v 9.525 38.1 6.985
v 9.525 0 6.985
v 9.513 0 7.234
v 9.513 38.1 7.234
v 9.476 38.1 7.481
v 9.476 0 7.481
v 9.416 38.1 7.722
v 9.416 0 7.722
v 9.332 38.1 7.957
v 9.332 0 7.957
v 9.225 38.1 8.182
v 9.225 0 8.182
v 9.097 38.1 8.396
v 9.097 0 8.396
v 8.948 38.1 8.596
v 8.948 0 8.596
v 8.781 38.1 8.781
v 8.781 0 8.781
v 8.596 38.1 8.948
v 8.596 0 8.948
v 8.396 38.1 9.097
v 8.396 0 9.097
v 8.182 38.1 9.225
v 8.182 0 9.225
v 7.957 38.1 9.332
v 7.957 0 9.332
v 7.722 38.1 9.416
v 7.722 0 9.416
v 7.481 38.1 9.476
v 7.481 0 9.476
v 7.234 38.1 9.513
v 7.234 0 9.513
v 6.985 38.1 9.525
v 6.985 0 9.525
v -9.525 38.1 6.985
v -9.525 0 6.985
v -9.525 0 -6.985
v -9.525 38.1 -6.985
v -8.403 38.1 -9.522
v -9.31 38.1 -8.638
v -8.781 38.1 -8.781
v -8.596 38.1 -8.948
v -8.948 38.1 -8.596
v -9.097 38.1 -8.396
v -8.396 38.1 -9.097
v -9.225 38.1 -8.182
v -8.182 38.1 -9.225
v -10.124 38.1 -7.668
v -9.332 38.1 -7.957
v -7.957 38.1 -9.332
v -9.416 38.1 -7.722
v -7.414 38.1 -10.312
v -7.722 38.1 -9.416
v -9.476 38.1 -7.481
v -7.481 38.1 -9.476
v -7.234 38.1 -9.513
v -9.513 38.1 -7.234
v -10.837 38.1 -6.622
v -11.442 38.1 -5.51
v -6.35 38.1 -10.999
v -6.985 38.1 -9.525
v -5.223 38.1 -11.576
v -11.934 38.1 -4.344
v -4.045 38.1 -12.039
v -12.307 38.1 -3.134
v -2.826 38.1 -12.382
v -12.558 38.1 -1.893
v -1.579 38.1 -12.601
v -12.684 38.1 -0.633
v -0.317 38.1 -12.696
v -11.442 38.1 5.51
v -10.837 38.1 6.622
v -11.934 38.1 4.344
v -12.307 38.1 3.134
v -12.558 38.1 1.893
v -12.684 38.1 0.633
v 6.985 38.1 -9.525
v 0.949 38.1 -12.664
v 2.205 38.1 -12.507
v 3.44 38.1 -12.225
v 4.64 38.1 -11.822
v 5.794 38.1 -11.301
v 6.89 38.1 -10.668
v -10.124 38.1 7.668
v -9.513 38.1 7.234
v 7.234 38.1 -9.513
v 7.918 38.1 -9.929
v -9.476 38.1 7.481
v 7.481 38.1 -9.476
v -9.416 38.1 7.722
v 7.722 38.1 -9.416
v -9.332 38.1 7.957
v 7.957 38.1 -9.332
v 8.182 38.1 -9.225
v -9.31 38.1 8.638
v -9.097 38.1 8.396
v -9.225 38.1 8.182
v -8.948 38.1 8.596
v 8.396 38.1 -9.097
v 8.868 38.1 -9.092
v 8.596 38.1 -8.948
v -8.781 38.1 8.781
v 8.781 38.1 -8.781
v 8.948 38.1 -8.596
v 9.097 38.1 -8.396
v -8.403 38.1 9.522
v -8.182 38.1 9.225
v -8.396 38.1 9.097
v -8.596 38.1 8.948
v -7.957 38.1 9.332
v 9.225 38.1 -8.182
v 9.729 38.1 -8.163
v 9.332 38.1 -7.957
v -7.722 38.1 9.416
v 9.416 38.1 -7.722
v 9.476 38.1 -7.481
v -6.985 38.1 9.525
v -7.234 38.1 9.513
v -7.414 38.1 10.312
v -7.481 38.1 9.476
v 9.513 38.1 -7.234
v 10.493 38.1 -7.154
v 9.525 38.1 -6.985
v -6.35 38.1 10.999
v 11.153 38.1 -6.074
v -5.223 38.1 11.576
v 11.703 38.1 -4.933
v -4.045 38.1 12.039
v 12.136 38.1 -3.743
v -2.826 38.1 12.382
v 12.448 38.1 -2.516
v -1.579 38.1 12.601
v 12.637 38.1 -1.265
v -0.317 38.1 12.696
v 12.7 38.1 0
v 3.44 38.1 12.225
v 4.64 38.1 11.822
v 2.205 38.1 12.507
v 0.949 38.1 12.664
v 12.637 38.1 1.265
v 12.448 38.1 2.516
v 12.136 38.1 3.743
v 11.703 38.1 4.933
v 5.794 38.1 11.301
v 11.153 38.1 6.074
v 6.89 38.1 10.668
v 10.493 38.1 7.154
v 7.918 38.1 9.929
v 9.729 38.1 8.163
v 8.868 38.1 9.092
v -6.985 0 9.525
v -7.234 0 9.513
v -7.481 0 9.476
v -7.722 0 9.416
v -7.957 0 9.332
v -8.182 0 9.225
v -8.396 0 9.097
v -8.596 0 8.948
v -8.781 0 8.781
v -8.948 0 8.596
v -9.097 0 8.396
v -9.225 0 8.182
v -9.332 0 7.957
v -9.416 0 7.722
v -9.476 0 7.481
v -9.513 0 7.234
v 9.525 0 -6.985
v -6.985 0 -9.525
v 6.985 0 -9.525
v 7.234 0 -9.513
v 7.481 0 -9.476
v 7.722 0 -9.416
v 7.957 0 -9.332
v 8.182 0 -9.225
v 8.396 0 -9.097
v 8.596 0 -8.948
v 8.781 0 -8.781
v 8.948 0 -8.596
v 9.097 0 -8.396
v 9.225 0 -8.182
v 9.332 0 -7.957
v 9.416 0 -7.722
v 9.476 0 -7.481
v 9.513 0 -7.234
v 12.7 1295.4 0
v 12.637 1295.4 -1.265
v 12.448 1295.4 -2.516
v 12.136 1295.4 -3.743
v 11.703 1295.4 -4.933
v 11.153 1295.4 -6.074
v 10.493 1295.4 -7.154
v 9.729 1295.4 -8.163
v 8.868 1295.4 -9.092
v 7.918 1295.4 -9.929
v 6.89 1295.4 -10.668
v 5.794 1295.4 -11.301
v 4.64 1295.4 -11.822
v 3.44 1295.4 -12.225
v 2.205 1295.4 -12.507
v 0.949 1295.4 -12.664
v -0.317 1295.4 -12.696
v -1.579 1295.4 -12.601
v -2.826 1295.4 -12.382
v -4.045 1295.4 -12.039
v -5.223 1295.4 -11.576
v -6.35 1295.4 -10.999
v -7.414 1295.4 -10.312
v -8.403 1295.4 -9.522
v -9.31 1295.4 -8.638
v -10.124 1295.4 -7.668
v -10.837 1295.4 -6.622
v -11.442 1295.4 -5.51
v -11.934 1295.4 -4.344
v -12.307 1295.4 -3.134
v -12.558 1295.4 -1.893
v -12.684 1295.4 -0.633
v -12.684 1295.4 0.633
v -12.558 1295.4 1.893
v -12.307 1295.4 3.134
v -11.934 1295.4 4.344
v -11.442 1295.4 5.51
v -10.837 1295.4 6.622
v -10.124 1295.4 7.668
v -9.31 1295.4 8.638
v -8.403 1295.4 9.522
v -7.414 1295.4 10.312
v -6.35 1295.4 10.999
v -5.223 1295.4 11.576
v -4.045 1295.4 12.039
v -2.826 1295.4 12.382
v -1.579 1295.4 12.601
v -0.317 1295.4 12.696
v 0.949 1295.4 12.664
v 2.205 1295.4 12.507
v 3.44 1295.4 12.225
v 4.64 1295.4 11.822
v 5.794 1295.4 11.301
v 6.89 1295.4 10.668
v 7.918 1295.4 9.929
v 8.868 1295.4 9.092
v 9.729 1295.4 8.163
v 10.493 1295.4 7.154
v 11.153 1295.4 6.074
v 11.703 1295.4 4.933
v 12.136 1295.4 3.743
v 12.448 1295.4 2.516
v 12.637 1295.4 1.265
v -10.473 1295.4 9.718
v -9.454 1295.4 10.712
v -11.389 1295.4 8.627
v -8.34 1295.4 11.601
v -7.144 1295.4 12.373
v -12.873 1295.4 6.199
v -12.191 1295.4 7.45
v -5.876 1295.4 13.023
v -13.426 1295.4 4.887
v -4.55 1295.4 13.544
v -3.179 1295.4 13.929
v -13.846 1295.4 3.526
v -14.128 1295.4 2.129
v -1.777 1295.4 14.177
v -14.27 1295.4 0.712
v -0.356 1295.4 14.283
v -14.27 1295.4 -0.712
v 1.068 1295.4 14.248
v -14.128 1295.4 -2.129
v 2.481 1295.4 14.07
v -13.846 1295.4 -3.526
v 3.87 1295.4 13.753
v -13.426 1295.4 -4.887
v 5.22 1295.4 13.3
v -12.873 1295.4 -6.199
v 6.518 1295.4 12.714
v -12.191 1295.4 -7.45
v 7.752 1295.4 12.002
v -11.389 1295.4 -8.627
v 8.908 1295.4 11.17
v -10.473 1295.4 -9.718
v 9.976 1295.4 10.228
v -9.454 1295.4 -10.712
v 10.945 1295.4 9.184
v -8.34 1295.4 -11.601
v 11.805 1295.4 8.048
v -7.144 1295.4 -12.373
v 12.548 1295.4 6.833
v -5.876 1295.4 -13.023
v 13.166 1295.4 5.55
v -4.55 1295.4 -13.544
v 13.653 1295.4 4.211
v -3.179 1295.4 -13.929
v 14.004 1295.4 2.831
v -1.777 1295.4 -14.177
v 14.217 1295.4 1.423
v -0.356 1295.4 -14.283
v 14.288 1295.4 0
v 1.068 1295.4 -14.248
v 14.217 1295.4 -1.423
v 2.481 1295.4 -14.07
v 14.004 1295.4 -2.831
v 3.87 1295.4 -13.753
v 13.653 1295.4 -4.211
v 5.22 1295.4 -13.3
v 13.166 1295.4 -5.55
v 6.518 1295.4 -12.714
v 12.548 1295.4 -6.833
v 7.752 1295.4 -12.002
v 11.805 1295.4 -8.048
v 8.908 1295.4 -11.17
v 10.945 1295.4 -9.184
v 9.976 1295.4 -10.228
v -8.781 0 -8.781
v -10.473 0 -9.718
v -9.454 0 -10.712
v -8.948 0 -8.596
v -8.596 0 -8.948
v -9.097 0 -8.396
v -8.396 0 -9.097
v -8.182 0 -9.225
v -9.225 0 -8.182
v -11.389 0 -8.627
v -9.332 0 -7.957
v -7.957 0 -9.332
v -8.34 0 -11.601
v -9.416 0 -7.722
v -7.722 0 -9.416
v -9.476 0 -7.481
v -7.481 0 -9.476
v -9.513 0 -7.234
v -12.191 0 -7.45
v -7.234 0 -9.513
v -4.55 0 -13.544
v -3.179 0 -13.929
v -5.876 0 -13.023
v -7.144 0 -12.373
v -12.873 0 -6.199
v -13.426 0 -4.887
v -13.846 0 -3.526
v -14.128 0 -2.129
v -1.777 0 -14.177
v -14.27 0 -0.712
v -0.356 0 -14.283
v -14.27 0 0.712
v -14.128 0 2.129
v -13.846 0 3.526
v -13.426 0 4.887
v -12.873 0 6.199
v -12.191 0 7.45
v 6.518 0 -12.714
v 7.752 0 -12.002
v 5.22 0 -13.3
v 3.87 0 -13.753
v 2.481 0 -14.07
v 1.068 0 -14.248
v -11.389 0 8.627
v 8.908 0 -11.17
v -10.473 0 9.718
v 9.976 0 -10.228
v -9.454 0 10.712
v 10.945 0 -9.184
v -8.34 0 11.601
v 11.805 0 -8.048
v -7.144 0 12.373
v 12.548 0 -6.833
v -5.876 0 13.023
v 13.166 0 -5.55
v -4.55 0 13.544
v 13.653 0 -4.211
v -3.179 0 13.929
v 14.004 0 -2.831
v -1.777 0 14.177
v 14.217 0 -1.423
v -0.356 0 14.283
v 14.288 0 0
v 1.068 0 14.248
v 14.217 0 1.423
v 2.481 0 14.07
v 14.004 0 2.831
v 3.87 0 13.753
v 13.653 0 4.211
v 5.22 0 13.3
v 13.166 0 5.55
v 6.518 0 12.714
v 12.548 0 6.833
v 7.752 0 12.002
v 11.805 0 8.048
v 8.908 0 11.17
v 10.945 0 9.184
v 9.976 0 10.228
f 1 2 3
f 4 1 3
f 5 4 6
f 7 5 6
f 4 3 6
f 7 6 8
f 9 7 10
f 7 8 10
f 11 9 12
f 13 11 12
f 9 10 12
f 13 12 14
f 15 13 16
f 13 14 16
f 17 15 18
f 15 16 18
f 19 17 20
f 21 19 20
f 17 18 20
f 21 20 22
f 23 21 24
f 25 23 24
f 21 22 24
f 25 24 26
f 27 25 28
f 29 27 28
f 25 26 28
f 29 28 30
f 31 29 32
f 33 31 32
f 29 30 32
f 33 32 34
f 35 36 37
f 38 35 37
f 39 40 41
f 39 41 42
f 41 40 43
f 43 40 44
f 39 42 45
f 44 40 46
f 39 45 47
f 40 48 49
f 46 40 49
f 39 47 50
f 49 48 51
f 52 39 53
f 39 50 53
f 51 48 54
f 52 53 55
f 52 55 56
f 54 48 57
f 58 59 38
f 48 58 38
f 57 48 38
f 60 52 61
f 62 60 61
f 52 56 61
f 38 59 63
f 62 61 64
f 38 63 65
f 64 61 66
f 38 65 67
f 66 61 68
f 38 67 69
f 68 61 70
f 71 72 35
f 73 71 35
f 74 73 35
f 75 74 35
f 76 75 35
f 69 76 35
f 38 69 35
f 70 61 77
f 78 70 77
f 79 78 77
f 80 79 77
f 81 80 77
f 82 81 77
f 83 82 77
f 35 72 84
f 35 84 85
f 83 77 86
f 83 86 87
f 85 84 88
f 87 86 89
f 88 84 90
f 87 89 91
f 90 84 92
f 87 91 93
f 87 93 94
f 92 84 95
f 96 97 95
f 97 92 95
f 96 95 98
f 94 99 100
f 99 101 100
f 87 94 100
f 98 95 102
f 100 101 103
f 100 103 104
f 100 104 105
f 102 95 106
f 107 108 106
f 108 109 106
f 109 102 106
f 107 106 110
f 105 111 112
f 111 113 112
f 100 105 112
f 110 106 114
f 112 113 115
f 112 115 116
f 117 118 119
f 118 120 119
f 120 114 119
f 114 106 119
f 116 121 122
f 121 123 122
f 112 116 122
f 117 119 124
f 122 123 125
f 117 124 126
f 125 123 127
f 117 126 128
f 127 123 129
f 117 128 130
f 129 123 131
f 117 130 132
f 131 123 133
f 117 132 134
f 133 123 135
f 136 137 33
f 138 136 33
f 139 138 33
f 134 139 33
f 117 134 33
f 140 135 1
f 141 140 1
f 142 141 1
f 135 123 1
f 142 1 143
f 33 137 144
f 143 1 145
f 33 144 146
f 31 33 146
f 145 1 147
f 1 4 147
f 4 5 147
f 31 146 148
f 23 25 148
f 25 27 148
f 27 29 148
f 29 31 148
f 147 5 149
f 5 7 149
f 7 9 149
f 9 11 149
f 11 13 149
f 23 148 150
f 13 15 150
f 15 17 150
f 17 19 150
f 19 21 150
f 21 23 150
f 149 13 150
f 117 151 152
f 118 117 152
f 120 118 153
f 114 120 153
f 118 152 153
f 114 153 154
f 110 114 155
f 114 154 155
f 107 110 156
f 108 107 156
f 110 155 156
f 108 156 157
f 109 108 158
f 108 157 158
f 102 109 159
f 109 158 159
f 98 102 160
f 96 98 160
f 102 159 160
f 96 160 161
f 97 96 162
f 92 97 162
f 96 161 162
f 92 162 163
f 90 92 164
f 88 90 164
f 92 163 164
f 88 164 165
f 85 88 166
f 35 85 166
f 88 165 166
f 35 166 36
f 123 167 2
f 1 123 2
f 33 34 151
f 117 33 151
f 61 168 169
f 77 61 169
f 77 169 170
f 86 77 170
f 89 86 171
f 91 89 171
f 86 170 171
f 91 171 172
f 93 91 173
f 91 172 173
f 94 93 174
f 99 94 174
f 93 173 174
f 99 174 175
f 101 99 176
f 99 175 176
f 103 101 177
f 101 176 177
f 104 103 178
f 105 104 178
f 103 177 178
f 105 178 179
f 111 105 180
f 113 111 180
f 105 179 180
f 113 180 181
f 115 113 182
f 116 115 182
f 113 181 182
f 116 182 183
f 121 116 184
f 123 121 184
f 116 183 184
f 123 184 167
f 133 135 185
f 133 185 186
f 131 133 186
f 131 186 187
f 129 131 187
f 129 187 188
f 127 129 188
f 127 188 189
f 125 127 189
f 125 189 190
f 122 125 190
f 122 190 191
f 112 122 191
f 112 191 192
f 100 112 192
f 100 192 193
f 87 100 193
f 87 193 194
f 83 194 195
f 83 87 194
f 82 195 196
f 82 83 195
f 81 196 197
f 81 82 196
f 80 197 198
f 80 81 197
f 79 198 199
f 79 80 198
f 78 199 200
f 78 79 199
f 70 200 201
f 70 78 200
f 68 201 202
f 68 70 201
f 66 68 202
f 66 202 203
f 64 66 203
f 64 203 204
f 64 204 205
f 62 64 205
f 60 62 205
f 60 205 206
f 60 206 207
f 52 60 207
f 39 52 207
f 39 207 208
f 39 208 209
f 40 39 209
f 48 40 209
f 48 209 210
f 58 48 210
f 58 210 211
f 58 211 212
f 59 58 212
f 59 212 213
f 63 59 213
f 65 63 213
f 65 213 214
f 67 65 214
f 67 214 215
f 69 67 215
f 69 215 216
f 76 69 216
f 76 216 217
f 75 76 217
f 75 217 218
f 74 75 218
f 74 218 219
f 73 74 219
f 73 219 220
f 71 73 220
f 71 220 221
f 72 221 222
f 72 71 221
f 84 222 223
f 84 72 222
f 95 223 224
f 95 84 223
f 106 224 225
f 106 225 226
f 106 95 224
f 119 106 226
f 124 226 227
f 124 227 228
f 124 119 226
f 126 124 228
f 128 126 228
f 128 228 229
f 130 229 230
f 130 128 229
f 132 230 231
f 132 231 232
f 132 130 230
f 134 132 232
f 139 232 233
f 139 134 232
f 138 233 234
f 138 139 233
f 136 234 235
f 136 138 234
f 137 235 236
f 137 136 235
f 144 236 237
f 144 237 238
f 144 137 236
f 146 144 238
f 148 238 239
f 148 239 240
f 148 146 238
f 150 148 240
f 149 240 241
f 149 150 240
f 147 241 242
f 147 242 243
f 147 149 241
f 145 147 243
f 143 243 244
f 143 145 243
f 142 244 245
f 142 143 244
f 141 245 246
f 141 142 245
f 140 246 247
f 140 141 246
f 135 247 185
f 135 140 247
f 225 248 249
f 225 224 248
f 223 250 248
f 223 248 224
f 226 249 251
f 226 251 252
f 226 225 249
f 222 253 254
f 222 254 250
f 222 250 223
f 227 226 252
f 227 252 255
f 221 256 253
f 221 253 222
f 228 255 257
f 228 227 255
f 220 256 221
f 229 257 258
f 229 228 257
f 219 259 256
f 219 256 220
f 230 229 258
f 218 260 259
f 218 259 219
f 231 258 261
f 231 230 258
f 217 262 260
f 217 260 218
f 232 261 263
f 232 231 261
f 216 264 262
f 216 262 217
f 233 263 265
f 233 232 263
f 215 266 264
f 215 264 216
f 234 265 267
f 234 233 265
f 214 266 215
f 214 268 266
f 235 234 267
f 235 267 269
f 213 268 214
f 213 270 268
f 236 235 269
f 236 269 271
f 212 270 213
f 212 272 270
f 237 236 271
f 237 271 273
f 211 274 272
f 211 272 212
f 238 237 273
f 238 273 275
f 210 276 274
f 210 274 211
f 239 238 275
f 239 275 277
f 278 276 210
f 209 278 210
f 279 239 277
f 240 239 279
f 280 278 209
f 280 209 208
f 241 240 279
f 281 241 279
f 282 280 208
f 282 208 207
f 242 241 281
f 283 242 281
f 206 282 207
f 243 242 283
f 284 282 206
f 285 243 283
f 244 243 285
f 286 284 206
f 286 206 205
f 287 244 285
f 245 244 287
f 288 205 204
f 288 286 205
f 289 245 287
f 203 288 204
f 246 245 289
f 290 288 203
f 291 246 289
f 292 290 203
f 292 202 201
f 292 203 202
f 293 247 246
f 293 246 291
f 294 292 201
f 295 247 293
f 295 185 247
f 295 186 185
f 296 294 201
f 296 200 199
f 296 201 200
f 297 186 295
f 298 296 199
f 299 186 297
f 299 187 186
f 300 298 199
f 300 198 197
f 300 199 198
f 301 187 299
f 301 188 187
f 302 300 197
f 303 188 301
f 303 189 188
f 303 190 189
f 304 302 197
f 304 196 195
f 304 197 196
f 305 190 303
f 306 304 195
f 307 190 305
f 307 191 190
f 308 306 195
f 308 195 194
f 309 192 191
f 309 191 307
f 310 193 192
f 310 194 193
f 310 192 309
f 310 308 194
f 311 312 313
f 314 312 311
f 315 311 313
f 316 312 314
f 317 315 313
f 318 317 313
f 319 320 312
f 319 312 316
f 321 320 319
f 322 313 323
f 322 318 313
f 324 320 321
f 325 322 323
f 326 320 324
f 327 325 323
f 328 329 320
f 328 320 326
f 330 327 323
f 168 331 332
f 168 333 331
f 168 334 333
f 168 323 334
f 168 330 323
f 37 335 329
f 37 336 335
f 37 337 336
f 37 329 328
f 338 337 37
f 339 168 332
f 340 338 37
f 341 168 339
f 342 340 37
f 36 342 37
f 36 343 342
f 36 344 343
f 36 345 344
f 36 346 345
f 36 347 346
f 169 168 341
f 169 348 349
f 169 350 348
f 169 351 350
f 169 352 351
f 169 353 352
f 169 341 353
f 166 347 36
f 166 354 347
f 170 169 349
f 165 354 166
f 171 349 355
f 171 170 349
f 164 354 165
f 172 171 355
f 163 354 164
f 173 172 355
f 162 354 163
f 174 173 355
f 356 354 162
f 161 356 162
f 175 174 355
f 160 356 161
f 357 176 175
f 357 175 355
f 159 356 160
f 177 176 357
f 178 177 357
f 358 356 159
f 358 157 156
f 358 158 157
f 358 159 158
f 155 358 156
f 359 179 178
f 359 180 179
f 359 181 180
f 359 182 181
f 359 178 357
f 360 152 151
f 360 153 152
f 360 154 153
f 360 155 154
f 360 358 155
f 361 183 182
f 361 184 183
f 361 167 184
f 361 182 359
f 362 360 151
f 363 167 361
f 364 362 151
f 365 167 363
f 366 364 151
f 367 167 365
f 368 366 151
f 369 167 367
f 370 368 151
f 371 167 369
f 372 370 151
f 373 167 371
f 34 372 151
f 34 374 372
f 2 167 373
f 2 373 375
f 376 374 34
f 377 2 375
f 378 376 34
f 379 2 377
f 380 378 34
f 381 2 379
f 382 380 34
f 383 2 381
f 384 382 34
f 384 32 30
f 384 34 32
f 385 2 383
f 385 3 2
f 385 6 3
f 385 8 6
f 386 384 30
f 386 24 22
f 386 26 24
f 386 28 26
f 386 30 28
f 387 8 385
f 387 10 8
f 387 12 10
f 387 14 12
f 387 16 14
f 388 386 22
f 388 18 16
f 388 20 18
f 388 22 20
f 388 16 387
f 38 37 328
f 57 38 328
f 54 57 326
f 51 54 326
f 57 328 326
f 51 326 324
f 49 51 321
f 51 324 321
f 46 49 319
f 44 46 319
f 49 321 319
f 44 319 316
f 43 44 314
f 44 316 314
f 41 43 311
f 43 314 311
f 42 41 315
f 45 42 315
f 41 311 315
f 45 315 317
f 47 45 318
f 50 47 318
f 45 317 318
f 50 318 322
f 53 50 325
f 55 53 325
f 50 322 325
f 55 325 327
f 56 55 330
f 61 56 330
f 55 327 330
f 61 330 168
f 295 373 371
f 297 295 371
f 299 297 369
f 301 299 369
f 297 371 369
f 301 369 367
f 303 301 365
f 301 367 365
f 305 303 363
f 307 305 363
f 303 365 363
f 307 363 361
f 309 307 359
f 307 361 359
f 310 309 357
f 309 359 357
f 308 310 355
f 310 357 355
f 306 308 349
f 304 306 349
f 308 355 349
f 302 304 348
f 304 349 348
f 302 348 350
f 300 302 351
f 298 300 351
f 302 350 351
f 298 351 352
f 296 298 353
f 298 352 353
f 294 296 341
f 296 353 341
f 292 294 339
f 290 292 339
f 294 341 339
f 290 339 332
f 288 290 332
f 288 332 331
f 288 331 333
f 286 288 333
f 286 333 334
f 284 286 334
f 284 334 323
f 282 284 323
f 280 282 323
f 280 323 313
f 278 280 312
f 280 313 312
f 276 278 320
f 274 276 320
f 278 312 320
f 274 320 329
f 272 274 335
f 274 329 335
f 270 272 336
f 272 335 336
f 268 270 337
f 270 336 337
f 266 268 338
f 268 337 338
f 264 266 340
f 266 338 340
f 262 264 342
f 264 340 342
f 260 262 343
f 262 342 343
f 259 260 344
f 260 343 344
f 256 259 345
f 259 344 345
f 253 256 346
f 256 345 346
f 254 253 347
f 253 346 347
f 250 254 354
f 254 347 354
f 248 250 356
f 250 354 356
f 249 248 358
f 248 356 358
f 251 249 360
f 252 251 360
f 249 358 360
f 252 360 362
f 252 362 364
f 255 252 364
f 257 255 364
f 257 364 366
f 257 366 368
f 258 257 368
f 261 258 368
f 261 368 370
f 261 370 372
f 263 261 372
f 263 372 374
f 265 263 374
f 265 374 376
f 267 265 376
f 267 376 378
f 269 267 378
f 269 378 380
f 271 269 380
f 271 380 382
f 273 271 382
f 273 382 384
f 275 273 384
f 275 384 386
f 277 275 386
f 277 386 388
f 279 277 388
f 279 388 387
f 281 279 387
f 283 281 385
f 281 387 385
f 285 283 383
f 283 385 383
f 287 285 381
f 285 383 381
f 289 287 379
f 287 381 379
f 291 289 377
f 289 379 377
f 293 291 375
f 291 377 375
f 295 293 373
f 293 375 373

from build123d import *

# Parameters (mm, degrees)
SKETCH1_R           = 14.2875
SKETCH1_R_2         = 12.7
BOSS_EXTRUDE1_DEPTH = 1295.4
SKETCH2_R           = 12.7
BOSS_EXTRUDE2_DEPTH = 38.1


with BuildPart() as part:
    # Sketch1 → Boss-Extrude1 (new body)
    with BuildSketch(Plane(origin=(0, 0, 0), x_dir=(1, 0, 0), z_dir=(0, 1, 0))):
        Circle(SKETCH1_R)
        Circle(SKETCH1_R_2, mode=Mode.SUBTRACT)
    extrude(amount=BOSS_EXTRUDE1_DEPTH)

    # Sketch2 → Boss-Extrude2 (add)
    with BuildSketch(Plane.XZ):
        Circle(SKETCH2_R)
        with BuildLine():
            ThreePointArc((-6.985, 9.525), (-8.781051224, 8.781051224), (-9.525, 6.985))
            Line((-9.525, 6.985), (-9.525, -6.985))
            ThreePointArc((-9.525, -6.985), (-8.781051224, -8.781051224), (-6.985, -9.525))
            Line((-6.985, -9.525), (6.985, -9.525))
            ThreePointArc((6.985, -9.525), (8.781051224, -8.781051224), (9.525, -6.985))
            Line((9.525, -6.985), (9.525, 6.985))
            ThreePointArc((9.525, 6.985), (8.781051224, 8.781051224), (6.985, 9.525))
            Line((6.985, 9.525), (-6.985, 9.525))
        make_face(mode=Mode.SUBTRACT)
    extrude(amount=-BOSS_EXTRUDE2_DEPTH)


solid = part.part
